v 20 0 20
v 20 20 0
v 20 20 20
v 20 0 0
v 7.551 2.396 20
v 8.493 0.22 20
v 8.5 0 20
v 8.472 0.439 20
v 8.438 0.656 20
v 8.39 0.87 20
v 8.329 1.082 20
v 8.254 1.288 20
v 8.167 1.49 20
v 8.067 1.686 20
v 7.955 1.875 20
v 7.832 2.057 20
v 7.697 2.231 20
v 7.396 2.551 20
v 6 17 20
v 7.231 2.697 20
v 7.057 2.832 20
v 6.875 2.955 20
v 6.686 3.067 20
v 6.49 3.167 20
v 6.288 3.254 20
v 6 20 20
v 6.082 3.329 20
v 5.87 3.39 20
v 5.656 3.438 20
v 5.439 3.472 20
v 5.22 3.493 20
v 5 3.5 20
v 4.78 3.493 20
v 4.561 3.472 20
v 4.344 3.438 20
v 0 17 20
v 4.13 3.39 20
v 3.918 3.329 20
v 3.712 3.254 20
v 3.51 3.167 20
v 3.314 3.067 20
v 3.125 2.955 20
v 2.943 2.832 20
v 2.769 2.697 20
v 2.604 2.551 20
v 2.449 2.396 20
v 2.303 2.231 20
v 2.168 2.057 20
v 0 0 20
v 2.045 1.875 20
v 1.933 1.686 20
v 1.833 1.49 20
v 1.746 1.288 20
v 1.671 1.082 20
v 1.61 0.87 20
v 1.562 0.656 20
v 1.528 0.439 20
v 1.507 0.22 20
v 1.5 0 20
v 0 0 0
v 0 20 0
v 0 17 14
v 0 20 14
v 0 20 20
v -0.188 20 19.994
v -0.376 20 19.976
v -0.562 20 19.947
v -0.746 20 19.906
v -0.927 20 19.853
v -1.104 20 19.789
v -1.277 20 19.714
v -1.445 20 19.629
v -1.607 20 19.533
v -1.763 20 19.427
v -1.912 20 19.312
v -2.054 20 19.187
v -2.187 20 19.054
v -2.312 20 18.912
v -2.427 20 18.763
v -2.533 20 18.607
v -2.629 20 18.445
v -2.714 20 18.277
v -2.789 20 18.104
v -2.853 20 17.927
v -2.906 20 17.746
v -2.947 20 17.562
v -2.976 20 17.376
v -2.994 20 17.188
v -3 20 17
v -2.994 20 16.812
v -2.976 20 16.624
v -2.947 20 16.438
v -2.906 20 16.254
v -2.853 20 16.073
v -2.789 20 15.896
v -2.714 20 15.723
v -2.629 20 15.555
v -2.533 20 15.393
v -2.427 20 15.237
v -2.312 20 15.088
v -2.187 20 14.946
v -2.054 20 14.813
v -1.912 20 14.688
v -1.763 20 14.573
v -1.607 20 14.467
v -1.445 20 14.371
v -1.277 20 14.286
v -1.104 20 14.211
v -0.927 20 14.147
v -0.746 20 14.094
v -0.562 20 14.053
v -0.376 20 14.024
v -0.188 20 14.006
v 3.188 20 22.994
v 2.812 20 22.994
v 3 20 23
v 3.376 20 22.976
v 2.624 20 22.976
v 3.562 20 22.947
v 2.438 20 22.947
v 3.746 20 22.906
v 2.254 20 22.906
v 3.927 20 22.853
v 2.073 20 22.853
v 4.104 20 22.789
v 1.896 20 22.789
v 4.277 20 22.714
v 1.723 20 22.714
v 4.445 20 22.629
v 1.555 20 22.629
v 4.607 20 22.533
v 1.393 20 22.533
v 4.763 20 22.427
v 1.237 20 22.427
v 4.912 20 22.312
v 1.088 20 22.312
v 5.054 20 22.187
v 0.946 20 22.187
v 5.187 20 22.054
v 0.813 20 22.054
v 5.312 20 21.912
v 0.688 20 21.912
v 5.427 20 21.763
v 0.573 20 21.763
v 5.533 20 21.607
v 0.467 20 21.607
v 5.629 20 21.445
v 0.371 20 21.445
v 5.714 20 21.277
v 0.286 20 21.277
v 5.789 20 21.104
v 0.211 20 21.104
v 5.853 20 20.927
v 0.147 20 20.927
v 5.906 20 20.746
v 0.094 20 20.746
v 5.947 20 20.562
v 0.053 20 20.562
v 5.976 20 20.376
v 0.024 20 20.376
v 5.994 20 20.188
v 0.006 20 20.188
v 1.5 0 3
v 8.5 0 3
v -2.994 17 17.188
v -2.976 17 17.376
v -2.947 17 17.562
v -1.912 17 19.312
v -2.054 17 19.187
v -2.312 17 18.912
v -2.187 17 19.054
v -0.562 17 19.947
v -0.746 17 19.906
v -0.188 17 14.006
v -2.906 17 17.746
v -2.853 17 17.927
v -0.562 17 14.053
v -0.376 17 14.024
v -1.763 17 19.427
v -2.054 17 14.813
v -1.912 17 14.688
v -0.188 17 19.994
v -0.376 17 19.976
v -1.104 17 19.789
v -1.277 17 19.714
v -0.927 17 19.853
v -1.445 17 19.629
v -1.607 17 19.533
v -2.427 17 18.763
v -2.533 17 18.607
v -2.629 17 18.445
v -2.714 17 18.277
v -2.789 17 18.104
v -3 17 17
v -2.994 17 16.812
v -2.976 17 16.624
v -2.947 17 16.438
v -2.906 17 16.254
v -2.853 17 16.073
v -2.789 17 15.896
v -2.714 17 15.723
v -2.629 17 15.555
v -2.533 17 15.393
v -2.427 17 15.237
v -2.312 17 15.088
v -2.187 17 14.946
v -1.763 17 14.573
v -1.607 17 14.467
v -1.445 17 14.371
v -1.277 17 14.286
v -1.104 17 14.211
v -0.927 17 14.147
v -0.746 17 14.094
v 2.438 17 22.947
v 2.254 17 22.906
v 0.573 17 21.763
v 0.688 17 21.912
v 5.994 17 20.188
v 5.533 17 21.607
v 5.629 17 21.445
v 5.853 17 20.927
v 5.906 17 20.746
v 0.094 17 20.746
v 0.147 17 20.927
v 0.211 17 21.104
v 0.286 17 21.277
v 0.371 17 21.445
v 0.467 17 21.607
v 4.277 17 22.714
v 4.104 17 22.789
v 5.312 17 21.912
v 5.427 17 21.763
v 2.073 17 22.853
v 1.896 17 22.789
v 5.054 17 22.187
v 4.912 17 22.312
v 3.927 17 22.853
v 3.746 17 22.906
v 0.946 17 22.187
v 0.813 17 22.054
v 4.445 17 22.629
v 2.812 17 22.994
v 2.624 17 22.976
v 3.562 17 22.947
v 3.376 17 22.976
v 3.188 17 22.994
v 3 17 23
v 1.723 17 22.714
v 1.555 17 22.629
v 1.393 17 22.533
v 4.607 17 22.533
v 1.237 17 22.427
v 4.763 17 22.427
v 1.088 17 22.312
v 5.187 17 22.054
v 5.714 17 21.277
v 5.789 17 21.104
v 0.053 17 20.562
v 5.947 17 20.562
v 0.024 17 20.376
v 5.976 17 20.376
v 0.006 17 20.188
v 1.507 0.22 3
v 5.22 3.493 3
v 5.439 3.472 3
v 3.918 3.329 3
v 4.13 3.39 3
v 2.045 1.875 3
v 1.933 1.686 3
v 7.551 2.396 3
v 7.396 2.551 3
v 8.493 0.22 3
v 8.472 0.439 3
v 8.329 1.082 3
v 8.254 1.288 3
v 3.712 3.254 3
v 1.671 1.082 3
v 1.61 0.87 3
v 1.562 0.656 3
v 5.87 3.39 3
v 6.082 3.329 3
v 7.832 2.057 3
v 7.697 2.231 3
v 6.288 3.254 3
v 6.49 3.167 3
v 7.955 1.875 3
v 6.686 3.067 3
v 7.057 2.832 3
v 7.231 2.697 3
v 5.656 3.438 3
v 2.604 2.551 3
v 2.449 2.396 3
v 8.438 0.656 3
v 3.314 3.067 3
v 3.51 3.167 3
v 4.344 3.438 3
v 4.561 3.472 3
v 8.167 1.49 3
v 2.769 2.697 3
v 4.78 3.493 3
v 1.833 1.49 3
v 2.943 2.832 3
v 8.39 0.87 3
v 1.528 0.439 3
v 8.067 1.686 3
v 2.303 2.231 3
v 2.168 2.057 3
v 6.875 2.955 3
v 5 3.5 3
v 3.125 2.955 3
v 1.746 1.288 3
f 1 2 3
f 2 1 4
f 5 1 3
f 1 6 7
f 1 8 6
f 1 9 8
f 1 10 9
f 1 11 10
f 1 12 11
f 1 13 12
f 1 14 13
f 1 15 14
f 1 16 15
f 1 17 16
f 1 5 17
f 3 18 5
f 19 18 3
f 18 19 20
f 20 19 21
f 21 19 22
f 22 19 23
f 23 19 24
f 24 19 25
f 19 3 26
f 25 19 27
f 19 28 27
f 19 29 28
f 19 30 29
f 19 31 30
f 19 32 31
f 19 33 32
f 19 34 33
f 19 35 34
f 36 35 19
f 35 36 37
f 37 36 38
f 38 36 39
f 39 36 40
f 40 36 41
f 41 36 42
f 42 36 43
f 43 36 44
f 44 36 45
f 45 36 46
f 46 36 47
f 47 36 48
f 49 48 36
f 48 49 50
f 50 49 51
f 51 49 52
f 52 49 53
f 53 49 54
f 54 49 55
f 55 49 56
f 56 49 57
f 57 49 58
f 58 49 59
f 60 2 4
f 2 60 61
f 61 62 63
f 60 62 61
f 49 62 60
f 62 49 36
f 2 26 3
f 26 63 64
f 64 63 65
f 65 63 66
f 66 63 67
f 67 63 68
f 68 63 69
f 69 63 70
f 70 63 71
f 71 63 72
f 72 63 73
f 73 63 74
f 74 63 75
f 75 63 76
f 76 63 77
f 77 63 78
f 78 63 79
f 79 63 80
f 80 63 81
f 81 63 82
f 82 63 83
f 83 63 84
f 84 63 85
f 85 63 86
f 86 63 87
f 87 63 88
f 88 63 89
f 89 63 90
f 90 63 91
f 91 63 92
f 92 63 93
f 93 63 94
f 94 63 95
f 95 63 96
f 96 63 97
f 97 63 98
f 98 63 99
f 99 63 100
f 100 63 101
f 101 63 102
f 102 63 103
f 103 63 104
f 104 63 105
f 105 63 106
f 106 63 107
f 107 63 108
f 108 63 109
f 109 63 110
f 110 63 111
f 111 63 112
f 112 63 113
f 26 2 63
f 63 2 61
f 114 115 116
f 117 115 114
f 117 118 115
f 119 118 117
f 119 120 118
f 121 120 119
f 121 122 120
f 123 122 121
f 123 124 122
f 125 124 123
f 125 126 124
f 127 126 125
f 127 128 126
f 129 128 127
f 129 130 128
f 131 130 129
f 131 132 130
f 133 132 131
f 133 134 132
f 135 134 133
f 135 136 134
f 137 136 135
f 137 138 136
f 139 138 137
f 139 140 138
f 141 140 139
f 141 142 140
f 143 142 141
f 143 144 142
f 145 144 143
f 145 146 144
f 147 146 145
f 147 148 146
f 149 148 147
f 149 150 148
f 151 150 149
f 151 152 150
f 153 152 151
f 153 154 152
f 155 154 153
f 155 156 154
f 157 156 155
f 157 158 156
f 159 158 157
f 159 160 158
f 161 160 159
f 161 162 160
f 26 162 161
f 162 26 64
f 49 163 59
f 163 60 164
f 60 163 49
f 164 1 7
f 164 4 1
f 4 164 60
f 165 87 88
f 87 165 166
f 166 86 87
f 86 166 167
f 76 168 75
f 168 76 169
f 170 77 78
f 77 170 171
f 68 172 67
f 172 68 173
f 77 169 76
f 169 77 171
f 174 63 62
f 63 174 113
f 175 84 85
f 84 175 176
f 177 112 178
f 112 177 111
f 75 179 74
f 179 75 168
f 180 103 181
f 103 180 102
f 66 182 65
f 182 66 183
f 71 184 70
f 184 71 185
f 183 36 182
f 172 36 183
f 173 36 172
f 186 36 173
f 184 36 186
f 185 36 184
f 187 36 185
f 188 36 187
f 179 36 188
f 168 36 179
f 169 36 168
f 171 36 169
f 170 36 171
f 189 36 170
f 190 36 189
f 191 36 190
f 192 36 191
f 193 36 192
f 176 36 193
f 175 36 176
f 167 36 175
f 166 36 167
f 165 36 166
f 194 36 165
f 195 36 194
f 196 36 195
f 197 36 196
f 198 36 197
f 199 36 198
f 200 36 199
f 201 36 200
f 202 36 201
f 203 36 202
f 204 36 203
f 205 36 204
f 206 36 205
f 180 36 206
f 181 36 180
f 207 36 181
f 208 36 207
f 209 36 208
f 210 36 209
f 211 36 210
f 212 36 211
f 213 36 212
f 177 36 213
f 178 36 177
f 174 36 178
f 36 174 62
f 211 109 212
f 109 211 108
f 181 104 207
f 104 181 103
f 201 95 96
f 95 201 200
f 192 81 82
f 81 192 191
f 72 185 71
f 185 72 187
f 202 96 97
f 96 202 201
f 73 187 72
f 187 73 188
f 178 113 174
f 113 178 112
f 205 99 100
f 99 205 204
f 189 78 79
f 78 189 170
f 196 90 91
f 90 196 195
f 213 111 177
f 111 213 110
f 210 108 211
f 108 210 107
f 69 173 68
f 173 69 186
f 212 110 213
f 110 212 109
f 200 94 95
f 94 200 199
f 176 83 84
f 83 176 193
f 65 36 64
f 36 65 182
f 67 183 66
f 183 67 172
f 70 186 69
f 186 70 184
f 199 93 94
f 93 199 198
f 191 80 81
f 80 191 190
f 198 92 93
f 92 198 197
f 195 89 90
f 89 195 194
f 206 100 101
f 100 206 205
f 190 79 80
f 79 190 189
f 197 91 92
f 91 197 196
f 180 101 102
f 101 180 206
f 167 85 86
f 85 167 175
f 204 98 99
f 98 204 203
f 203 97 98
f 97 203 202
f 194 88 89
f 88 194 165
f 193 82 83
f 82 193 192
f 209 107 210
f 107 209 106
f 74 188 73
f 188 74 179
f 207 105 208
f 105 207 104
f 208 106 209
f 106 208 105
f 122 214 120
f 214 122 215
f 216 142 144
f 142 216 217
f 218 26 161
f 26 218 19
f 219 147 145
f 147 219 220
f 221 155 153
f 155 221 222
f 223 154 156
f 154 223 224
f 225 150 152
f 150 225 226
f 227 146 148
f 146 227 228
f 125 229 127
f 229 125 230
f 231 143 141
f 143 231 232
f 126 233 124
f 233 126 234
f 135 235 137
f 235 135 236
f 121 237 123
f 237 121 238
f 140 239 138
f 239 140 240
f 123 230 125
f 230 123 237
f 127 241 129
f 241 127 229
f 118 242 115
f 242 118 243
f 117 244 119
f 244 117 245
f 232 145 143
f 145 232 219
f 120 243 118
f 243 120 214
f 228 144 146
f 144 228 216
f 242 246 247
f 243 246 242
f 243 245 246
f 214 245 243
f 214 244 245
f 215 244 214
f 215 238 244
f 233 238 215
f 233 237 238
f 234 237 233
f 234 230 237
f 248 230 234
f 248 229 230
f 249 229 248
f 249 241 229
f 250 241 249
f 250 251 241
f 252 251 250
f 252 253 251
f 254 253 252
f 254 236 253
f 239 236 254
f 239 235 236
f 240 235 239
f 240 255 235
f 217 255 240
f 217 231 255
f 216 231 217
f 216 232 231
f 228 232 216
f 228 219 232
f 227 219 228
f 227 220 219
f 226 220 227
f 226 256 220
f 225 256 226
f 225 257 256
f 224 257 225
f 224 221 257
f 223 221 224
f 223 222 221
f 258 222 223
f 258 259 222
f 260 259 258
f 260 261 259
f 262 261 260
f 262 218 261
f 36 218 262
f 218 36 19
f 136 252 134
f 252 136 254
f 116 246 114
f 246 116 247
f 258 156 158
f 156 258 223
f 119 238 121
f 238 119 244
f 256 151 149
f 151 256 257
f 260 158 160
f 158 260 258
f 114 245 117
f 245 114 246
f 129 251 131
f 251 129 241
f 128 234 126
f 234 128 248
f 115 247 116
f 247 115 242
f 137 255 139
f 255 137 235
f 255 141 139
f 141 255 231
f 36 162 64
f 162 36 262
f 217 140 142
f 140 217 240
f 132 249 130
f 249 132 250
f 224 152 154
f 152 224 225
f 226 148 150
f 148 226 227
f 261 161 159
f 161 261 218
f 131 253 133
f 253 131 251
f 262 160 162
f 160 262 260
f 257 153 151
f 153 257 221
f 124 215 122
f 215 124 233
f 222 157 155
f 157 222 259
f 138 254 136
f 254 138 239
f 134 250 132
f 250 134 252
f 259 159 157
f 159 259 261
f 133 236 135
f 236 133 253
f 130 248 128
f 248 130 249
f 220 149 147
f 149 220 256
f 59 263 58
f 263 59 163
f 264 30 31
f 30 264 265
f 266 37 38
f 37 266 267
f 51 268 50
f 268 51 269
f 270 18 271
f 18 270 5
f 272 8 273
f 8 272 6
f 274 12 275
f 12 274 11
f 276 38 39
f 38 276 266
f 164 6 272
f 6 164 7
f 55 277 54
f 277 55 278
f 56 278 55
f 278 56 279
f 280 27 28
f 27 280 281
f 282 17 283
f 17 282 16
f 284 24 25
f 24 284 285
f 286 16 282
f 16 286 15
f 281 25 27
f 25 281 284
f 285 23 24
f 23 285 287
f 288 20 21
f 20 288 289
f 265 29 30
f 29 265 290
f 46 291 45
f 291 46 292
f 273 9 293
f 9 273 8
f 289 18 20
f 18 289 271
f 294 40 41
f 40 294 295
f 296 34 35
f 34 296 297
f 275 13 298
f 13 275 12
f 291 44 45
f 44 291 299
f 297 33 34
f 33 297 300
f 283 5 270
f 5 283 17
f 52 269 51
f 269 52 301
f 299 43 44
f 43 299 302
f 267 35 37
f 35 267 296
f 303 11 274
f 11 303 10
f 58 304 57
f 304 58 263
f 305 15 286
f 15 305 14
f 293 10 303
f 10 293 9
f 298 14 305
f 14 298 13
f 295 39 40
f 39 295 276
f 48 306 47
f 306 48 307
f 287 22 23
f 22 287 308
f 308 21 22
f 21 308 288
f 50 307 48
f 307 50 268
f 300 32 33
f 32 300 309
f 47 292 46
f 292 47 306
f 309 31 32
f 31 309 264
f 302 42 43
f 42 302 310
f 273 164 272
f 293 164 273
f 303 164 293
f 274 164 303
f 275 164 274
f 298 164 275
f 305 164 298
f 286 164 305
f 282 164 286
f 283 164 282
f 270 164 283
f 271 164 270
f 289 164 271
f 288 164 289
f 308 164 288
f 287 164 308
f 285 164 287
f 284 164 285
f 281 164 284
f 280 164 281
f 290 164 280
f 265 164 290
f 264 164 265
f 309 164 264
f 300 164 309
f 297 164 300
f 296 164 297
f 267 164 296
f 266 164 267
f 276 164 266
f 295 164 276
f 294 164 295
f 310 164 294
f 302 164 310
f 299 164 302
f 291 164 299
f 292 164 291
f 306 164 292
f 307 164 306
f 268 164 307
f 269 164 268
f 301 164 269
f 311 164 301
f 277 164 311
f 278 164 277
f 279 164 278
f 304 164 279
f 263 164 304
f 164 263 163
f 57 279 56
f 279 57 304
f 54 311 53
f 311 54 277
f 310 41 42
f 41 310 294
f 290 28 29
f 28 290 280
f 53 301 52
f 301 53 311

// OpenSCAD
$fn = 100; // resolution

cube_size = 20;
hole_diameter = 7;
rounding = 3;

module rounded_top_front_edge_cube(size, r) {
    // Base cube
    cube(size, center = false);

    // Round top-front edge by subtracting quarter cylinder
    translate([0, size, size - r])
        rotate([90, 0, 0])
            cylinder(r = r, h = r, center = false, $fn = 100);

    // Round top-front edge by subtracting quarter cylinder along Y direction
    translate([r, size - r, size])
        rotate([-90, 90, 0])
            cylinder(r = r, h = r, center = false, $fn = 100);
}

difference() {
    rounded_top_front_edge_cube(cube_size, rounding);

    // Hole (cylinder) shifted right 5 and up 3
    translate([5, 0, 3])
        cylinder(d = hole_diameter, h = cube_size + 1, center = false);
}
